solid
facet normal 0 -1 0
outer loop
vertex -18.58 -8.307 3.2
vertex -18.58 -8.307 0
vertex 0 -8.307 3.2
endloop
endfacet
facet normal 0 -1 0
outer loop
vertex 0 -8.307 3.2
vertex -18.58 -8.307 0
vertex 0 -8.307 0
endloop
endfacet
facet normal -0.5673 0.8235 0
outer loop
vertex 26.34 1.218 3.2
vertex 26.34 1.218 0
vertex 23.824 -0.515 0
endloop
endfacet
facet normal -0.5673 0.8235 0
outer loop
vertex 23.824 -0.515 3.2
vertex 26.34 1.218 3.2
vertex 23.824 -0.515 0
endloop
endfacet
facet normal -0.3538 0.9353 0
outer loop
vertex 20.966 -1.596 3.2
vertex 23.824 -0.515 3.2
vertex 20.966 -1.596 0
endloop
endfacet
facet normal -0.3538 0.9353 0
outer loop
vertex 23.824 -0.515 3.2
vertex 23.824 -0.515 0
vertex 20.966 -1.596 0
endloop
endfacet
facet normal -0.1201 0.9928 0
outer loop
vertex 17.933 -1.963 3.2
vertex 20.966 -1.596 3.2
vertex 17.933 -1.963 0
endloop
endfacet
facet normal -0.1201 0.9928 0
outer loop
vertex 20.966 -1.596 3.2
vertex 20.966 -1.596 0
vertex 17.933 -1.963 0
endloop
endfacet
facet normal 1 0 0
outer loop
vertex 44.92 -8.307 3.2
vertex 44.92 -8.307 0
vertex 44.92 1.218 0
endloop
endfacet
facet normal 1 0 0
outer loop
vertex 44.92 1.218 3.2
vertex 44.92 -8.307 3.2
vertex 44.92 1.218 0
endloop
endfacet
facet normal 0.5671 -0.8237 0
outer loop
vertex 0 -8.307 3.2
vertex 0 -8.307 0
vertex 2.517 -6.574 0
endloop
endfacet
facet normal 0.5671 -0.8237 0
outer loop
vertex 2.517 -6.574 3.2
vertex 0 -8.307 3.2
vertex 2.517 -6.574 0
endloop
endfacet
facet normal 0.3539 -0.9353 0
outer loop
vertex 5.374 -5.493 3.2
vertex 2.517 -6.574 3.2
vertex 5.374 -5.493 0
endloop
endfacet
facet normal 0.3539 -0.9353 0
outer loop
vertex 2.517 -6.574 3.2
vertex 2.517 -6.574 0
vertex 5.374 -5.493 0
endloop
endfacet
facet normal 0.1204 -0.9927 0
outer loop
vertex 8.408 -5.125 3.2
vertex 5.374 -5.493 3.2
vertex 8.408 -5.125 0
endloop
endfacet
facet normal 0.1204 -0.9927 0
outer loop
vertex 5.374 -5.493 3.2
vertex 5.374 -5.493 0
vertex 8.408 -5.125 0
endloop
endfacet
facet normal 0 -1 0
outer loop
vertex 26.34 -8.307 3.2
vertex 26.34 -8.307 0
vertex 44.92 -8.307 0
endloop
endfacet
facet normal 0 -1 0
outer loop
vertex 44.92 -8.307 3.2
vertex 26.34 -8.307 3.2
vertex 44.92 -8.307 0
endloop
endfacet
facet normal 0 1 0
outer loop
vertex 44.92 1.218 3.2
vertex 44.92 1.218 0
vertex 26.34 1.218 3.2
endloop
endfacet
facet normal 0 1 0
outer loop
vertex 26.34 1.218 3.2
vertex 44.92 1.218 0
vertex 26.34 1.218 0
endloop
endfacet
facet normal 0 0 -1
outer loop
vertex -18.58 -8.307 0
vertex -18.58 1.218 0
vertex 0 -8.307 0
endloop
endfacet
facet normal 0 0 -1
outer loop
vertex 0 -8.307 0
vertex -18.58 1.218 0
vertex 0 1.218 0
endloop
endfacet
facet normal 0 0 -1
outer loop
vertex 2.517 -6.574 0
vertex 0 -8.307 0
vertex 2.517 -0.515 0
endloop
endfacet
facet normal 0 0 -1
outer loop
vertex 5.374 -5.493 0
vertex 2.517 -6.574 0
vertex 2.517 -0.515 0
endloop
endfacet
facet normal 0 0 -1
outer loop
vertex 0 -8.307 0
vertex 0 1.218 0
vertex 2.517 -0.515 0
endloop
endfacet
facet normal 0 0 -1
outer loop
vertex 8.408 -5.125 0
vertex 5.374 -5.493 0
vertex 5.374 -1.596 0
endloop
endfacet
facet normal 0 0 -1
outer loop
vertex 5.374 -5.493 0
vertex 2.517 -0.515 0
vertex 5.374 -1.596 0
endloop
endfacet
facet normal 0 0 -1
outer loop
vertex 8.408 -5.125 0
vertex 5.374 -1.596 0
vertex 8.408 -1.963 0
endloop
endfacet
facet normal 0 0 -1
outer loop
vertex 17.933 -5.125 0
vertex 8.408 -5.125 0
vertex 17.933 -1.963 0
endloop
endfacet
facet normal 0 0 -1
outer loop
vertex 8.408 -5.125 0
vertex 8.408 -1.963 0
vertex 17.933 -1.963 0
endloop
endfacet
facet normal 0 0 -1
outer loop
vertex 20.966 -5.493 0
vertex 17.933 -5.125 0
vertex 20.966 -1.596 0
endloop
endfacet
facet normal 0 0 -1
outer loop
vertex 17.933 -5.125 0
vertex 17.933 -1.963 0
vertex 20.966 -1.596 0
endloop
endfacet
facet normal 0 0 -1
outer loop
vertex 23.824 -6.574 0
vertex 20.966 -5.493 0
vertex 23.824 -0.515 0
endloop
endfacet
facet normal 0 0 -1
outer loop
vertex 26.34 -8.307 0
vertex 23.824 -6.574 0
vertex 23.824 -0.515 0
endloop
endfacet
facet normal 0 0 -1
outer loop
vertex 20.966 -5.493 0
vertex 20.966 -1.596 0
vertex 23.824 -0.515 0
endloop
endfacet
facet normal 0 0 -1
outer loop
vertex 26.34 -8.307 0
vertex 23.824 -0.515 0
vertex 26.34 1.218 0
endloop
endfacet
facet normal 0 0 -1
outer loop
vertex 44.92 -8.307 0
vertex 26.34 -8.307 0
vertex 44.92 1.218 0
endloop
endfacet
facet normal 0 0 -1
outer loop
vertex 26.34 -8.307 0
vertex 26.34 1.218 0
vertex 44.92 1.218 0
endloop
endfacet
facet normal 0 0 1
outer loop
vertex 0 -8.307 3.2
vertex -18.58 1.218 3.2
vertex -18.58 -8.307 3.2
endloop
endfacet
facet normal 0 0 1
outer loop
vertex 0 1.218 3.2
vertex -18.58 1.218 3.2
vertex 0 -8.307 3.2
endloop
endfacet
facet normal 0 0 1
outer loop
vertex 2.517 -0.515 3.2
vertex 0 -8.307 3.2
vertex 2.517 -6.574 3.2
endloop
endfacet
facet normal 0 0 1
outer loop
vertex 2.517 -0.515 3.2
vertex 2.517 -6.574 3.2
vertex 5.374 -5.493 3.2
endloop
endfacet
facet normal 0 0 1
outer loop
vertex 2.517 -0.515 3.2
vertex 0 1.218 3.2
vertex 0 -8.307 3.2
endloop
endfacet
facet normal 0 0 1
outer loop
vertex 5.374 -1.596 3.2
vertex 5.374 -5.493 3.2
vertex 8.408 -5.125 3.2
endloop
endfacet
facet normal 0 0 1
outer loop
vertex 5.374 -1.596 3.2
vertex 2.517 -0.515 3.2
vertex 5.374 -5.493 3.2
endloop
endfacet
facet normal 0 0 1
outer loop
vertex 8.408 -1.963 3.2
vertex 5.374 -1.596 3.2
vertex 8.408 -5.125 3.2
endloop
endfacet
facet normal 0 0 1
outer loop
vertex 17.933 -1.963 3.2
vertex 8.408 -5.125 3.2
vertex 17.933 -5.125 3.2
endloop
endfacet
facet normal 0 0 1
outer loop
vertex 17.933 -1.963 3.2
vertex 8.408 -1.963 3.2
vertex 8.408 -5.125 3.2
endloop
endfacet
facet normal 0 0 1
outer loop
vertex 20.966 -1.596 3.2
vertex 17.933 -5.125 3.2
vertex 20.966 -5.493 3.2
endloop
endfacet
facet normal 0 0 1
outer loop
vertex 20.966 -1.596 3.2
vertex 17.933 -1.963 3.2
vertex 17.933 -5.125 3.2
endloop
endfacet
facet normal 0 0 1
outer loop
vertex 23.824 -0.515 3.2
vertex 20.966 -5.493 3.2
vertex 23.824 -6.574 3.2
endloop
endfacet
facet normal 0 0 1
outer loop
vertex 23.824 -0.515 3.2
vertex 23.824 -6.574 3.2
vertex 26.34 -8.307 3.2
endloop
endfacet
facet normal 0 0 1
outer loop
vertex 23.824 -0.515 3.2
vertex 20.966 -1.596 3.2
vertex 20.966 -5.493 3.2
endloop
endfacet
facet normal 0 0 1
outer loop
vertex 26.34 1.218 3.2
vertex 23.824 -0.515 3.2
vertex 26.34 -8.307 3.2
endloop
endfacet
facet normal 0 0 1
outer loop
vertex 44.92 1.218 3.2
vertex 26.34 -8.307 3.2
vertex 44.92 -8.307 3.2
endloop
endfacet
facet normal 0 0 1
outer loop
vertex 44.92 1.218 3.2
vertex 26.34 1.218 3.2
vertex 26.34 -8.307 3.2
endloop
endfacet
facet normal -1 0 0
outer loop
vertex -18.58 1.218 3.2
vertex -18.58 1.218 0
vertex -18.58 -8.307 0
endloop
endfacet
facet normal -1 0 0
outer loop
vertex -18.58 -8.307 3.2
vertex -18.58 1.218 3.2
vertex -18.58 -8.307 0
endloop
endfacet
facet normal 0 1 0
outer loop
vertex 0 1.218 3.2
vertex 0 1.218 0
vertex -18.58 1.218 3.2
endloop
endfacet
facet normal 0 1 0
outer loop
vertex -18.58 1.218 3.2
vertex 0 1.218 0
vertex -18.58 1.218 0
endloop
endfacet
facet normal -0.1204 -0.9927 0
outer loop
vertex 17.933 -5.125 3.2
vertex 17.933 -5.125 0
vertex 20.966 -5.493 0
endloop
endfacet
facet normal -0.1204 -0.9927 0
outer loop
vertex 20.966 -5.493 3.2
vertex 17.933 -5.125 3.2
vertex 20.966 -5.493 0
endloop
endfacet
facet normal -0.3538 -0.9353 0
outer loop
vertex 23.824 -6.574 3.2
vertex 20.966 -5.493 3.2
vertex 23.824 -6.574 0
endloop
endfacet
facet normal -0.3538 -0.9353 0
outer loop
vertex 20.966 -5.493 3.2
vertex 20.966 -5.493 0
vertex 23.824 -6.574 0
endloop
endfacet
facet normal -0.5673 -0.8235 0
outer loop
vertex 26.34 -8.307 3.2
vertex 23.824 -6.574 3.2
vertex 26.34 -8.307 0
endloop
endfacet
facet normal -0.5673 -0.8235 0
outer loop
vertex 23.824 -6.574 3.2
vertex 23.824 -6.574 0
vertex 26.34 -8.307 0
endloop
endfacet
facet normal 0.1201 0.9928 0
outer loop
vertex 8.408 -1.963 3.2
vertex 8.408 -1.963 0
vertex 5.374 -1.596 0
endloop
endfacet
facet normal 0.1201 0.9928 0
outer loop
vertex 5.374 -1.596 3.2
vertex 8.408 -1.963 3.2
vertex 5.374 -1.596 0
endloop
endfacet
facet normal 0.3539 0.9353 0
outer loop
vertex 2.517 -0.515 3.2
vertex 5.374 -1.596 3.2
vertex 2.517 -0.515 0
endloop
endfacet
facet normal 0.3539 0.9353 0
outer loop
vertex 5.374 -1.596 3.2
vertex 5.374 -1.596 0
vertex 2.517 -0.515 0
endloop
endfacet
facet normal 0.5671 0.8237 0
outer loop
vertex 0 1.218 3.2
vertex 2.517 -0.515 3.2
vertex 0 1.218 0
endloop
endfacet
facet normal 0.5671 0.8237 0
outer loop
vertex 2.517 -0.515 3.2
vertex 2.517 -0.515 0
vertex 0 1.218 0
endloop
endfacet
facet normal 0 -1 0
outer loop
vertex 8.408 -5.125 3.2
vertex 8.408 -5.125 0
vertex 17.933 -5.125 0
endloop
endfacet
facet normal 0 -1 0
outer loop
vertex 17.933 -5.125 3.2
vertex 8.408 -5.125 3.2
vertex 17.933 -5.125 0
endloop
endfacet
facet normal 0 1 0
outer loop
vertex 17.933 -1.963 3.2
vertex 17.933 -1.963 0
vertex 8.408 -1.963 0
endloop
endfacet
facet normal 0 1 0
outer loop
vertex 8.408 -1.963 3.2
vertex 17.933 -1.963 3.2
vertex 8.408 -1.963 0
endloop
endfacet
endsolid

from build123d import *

# Parameters (mm, degrees)
F1_DEPTH = 3.2


with BuildPart() as f1:
    # F0 (on Top) → F1 (new body)
    with BuildSketch(Plane.XY):
        with BuildLine():
            Line((0, 1.218053), (-18.579833, 1.218053))
            Line((-18.579833, 1.218053), (-18.579833, -3.544447))
            Line((-18.579833, -3.544447), (-18.579833, -8.306947))
            Line((-18.579833, -8.306947), (0, -8.306947))
            ThreePointArc((0, -8.306947), (3.912919, -5.947395), (8.407667, -5.125409))
            Line((8.407667, -5.125409), (13.170167, -5.125409))
            Line((13.170167, -5.125409), (13.170167, -1.963484))
            Line((13.170167, -1.963484), (8.407667, -1.963484))
            ThreePointArc((8.407667, -1.963484), (3.912919, -1.141499), (0, 1.218053))
        make_face()
        with BuildLine():
            Line((17.932667, -1.963484), (13.170167, -1.963484))
            Line((13.170167, -1.963484), (13.170167, -5.125409))
            Line((13.170167, -5.125409), (17.932667, -5.125409))
            ThreePointArc((17.932667, -5.125409), (22.427415, -5.947395), (26.340334, -8.306947))
            Line((26.340334, -8.306947), (44.920167, -8.306947))
            Line((44.920167, -8.306947), (44.920167, -3.544447))
            Line((44.920167, -3.544447), (44.920167, 1.218053))
            Line((44.920167, 1.218053), (26.340334, 1.218053))
            ThreePointArc((26.340334, 1.218053), (22.427415, -1.141499), (17.932667, -1.963484))
        make_face()
    extrude(amount=F1_DEPTH)


solid = f1.part
